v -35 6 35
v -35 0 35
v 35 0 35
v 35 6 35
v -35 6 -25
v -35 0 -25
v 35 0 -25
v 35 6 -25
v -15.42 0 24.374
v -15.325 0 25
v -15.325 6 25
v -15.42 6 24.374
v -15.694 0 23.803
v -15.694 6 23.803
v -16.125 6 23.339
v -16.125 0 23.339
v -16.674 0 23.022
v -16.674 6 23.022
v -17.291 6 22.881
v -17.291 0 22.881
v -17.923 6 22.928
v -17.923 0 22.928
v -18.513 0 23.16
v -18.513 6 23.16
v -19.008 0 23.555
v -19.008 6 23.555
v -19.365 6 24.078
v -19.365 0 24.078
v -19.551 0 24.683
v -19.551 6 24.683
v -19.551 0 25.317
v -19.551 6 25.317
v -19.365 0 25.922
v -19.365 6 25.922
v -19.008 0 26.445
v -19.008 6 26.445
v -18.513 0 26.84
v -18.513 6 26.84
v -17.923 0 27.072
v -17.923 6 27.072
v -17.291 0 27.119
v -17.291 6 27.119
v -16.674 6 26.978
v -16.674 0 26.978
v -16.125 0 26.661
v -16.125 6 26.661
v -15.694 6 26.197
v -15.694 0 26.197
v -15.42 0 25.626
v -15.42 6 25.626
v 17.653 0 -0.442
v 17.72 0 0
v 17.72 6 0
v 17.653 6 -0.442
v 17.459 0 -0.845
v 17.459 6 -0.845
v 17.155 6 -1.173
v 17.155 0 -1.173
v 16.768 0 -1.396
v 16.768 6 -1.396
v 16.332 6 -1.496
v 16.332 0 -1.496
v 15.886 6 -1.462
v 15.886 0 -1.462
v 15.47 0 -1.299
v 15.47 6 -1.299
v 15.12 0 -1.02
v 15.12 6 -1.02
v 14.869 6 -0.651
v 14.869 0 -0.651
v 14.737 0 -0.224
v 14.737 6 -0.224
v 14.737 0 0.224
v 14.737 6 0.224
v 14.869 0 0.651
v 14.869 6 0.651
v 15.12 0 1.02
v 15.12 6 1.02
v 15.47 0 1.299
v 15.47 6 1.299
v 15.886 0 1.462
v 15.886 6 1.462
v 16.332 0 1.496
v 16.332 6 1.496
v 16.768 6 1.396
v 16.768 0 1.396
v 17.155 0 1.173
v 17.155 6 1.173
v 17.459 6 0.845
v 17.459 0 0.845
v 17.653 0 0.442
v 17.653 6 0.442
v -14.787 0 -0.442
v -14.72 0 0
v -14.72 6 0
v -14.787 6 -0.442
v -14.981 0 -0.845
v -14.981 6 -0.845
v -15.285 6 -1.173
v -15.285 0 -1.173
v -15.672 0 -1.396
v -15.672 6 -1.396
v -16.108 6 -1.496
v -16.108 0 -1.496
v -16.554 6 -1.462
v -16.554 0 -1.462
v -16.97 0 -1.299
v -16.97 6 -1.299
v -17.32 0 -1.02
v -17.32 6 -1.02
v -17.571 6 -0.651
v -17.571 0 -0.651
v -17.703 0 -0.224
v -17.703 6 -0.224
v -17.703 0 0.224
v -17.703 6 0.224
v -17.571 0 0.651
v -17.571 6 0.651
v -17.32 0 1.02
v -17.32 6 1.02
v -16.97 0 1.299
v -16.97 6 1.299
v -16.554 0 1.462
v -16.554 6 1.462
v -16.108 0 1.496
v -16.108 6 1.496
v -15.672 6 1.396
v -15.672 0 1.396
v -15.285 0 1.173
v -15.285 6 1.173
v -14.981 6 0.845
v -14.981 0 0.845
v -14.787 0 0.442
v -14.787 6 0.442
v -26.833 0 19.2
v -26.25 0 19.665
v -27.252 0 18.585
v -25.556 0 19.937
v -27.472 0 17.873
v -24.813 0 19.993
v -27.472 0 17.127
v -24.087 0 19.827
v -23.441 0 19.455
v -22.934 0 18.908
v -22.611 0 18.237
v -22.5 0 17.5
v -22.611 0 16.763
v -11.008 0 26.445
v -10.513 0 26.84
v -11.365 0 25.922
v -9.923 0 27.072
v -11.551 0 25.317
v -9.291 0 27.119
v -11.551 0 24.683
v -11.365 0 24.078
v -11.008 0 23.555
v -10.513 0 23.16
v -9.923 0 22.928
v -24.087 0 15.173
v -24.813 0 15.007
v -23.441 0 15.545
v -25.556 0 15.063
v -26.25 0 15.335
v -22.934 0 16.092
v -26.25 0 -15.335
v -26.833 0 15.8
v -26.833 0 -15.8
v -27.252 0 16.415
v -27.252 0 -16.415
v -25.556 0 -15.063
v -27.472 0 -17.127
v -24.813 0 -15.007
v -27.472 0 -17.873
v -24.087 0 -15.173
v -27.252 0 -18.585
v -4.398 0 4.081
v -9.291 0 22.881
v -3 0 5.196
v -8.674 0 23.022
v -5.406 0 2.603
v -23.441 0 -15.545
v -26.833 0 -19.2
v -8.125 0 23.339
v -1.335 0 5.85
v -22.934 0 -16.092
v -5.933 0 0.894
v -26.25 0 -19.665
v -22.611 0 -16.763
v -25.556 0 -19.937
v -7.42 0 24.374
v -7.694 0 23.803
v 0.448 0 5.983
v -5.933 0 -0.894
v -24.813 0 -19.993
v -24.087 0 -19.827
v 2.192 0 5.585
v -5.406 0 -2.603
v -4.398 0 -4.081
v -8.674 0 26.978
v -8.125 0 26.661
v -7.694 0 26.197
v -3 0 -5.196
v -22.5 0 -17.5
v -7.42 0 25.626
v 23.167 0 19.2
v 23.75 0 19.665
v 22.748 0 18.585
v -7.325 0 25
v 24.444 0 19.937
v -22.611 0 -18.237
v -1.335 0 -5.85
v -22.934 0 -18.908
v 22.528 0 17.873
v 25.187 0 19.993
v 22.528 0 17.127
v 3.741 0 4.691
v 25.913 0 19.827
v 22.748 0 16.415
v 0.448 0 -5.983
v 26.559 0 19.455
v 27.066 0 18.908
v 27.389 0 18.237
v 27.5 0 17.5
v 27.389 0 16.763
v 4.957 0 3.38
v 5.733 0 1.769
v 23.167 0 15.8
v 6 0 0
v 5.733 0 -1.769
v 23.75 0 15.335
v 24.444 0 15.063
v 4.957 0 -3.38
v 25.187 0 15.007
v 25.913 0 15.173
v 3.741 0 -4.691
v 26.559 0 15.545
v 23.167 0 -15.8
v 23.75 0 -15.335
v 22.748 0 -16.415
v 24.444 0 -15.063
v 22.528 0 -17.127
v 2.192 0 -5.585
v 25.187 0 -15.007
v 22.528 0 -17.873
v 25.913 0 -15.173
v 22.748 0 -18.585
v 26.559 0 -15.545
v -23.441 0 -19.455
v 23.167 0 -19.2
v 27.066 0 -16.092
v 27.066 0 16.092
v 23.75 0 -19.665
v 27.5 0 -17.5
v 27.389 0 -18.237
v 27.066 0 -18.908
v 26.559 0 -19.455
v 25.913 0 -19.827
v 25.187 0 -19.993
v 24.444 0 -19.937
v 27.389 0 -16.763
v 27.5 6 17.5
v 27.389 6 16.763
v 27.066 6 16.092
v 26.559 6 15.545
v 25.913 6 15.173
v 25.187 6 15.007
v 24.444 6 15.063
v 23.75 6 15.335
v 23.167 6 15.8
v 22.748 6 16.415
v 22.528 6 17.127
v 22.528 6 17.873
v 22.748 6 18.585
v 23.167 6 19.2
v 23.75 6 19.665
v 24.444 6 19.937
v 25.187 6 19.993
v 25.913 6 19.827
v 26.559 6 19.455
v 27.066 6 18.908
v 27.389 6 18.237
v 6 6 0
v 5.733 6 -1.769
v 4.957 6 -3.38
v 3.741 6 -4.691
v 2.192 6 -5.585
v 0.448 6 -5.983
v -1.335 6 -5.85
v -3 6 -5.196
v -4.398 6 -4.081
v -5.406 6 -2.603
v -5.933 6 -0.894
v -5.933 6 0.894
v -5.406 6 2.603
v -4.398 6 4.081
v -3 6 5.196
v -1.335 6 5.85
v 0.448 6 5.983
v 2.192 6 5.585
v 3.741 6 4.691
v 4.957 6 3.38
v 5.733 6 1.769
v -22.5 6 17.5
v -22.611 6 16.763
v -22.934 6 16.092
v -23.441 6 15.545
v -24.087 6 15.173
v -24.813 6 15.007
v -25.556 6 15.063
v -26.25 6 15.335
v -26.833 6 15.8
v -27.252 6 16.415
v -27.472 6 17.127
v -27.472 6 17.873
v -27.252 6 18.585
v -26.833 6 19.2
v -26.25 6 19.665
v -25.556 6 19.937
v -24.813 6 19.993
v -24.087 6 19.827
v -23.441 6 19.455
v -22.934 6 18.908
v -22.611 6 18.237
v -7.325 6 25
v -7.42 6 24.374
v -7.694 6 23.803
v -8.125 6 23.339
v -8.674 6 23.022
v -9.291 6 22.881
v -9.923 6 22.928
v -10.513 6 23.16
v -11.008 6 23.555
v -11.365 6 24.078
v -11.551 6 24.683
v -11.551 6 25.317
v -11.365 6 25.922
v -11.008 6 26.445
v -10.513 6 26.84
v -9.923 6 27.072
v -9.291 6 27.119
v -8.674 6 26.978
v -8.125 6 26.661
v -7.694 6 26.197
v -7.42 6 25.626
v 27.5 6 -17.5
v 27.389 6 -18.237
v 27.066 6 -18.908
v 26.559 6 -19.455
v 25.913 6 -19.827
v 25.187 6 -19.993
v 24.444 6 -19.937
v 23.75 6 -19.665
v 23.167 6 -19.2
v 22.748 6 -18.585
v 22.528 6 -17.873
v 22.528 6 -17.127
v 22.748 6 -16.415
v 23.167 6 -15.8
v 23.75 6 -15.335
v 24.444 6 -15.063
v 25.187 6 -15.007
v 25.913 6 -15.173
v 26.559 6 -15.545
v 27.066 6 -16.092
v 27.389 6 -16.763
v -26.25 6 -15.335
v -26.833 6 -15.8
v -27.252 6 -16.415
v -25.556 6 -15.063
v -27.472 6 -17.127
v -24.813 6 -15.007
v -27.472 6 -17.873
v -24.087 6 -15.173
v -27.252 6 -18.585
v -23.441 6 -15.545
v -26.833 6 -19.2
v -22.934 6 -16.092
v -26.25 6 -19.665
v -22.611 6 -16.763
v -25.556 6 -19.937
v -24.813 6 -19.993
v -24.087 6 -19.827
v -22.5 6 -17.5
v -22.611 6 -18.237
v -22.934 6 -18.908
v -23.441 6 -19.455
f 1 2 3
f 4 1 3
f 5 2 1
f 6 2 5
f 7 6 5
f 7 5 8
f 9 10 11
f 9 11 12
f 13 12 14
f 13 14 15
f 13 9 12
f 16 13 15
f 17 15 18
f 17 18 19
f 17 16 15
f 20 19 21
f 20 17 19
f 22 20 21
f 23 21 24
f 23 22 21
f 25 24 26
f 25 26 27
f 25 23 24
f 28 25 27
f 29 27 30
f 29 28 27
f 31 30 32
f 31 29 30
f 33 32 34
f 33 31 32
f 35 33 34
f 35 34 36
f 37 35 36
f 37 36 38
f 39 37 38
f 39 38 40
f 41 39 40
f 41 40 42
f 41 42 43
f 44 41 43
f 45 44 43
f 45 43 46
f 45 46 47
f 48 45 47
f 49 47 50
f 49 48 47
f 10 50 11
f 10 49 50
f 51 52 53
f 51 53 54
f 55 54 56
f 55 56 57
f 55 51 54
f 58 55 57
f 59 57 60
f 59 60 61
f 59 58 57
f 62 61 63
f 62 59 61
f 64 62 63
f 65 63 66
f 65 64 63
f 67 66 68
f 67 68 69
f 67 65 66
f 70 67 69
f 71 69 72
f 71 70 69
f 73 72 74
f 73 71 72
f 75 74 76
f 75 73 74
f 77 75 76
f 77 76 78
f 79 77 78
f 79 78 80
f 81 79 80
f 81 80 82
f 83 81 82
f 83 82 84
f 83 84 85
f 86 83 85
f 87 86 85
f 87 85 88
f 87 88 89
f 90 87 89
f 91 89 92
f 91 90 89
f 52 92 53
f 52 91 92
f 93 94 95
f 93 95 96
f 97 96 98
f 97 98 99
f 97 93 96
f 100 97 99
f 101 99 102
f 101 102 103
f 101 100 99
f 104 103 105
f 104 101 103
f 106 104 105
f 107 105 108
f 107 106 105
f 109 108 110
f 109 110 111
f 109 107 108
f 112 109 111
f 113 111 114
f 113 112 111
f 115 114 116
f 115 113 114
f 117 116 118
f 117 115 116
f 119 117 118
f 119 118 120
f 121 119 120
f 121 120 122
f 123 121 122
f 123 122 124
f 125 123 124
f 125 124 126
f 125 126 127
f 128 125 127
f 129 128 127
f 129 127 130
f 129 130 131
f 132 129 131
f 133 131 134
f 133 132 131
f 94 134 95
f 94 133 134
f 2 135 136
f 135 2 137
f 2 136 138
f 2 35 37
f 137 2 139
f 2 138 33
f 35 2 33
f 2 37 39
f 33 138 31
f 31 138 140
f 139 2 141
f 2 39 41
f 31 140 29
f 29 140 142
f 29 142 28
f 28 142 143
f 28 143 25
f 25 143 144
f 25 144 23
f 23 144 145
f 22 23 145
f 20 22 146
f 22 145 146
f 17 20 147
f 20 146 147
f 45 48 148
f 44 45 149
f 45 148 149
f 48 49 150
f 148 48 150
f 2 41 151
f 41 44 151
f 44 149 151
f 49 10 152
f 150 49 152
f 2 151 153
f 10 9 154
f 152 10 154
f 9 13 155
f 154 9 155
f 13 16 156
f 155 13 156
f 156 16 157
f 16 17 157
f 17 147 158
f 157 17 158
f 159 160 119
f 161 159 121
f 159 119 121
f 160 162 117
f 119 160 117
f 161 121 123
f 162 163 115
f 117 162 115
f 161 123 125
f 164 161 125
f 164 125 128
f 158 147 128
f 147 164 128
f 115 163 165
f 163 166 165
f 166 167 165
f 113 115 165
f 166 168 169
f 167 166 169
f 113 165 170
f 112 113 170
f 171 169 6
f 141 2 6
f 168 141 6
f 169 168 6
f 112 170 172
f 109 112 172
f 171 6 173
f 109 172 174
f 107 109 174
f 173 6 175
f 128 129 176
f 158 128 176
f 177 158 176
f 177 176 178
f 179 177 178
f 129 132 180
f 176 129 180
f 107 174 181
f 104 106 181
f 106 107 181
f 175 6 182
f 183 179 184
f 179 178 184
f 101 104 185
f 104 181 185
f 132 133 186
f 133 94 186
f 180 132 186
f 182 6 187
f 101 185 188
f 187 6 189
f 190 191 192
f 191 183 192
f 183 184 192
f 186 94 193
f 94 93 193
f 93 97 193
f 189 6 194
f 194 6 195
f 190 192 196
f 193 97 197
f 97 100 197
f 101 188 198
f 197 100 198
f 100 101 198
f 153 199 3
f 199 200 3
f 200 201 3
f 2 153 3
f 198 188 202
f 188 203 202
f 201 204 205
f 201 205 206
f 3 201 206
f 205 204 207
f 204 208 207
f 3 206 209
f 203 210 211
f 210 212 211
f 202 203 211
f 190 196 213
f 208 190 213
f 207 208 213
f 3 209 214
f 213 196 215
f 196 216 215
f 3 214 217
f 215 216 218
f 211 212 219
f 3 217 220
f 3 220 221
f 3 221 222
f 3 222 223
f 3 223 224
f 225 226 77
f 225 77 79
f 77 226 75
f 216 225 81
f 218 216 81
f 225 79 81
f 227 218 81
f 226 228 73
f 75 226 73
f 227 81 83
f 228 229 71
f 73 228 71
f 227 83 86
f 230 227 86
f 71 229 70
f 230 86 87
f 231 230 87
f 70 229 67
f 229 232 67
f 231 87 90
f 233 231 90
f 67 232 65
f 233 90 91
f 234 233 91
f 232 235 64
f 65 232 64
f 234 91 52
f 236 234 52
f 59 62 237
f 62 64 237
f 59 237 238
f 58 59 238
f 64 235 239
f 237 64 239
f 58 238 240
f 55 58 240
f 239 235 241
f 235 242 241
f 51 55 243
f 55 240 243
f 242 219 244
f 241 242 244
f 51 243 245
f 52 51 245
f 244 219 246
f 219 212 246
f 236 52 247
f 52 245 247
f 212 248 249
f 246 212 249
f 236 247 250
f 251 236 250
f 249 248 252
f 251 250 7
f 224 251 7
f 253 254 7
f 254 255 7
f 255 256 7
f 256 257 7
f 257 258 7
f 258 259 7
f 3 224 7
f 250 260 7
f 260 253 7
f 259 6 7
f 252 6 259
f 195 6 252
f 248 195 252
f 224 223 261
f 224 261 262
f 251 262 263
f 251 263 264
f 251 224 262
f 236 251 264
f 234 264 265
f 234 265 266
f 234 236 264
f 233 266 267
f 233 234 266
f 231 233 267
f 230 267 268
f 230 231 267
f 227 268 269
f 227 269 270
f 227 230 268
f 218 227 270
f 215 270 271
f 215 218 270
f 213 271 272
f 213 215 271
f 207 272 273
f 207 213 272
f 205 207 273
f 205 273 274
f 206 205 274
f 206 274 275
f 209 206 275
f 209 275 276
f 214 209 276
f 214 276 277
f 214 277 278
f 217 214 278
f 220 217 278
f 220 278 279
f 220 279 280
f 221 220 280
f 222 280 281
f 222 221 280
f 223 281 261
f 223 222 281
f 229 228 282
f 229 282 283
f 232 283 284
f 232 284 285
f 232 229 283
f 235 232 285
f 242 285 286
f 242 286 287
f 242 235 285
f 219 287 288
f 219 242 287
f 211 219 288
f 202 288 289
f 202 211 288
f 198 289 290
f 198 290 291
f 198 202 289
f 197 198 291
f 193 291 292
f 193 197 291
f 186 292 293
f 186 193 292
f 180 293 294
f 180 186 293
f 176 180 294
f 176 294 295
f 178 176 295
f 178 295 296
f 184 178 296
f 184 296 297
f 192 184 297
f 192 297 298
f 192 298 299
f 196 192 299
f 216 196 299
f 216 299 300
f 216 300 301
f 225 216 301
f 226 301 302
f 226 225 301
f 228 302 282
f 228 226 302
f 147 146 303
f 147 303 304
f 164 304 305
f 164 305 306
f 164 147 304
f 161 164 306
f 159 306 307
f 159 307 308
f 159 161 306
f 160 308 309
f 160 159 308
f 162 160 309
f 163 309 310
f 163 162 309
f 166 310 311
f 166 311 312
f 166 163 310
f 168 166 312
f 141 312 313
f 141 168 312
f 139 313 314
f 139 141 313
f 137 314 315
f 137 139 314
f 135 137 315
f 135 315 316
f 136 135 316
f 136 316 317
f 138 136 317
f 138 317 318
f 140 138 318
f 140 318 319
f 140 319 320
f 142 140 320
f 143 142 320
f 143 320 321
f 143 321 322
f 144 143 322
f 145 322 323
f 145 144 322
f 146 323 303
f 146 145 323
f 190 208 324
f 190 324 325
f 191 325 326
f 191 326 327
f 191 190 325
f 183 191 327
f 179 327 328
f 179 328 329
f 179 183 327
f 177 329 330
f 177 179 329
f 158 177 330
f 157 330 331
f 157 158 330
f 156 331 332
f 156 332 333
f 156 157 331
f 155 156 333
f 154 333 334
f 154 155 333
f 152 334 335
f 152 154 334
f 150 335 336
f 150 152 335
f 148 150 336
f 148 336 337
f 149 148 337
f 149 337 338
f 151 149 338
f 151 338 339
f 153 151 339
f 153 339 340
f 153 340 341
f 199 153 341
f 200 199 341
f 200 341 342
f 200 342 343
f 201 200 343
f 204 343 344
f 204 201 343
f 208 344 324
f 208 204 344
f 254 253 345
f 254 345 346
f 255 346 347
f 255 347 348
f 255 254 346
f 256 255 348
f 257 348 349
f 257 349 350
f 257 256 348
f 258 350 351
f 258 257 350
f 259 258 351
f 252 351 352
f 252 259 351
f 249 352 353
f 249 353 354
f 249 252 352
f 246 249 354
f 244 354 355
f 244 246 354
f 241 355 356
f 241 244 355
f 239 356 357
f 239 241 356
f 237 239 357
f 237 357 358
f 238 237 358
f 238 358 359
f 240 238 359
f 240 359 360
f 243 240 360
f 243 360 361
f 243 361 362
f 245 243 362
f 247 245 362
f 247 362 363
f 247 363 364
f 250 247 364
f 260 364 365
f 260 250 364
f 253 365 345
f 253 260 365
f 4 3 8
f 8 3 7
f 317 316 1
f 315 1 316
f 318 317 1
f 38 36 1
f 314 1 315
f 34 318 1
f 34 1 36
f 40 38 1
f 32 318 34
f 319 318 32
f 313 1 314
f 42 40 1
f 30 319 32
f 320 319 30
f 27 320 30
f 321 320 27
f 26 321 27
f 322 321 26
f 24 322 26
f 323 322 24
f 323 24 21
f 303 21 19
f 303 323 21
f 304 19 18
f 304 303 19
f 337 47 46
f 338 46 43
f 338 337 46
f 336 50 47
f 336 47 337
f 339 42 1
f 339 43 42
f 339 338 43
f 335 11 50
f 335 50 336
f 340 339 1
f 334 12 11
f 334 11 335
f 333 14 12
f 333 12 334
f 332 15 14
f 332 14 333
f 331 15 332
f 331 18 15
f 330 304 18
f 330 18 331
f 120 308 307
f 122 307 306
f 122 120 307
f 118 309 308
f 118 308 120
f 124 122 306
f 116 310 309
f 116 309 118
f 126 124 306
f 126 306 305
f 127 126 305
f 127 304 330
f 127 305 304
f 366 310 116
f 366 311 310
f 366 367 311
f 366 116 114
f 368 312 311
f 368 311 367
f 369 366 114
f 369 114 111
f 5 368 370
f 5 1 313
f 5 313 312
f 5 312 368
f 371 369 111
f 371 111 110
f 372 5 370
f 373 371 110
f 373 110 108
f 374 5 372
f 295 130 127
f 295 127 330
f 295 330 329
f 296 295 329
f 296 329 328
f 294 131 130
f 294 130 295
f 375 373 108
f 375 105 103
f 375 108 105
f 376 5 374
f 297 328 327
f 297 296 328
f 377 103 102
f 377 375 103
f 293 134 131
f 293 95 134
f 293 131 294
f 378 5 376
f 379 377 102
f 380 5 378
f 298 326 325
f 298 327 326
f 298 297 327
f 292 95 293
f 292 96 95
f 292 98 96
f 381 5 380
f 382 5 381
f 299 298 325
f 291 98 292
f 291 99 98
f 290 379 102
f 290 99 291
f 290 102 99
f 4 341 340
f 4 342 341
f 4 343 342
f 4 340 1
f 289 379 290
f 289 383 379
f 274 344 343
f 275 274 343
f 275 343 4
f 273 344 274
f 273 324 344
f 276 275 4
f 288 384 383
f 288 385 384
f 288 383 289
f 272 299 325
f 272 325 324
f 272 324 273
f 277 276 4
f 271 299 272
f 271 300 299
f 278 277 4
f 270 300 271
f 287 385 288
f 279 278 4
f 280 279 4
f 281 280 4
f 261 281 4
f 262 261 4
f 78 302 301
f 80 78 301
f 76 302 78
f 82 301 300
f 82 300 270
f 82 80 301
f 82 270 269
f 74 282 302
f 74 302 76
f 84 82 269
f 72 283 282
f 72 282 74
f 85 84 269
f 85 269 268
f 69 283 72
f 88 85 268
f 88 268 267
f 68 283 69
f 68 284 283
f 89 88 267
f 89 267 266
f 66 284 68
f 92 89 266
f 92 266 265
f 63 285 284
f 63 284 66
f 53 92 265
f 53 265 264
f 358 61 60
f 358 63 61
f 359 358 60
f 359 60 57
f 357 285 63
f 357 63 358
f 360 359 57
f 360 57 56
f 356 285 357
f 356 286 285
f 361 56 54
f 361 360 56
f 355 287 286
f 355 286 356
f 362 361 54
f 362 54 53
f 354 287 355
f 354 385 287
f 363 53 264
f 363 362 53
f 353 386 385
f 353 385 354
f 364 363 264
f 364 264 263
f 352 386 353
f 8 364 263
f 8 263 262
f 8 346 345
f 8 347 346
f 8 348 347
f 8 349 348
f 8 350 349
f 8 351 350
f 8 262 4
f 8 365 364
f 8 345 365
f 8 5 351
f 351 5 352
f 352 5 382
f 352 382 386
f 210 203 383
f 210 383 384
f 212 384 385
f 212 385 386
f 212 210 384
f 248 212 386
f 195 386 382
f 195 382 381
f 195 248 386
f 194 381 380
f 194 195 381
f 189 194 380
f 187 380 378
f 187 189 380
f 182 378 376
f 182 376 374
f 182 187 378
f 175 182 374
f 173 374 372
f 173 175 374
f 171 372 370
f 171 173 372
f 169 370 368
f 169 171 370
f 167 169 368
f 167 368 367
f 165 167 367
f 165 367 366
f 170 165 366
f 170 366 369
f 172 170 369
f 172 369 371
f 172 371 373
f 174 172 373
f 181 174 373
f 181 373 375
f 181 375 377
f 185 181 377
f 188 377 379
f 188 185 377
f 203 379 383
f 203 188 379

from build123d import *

# Parameters (mm, degrees)
SKETCH1_W           = 70
SKETCH1_H           = 60
SKETCH1_R           = 2.125
SKETCH1_R_2         = 2.5
SKETCH1_R_3         = 1.5
SKETCH1_R_4         = 6
BOSS_EXTRUDE1_DEPTH = 6


with BuildPart() as part:
    # Sketch1 → Boss-Extrude1 (new body)
    with BuildSketch(Plane(origin=(0, 0, 0), x_dir=(1, 0, 0), z_dir=(0, 1, 0))):
        with Locations((0, -5)):
            Rectangle(SKETCH1_W, SKETCH1_H)
        with Locations((-9.450109616, -25)):
            Circle(SKETCH1_R, mode=Mode.SUBTRACT)
        with Locations((-17.450109616, -25)):
            Circle(SKETCH1_R, mode=Mode.SUBTRACT)
        with Locations((-25, -17.5)):
            Circle(SKETCH1_R_2, mode=Mode.SUBTRACT)
        with Locations((25, -17.5)):
            Circle(SKETCH1_R_2, mode=Mode.SUBTRACT)
        with Locations((-16.22, 0)):
            Circle(SKETCH1_R_3, mode=Mode.SUBTRACT)
        Circle(SKETCH1_R_4, mode=Mode.SUBTRACT)
        with Locations((-25, 17.5)):
            Circle(SKETCH1_R_2, mode=Mode.SUBTRACT)
        with Locations((16.22, 0)):
            Circle(SKETCH1_R_3, mode=Mode.SUBTRACT)
        with Locations((25, 17.5)):
            Circle(SKETCH1_R_2, mode=Mode.SUBTRACT)
    extrude(amount=BOSS_EXTRUDE1_DEPTH)


solid = part.part
